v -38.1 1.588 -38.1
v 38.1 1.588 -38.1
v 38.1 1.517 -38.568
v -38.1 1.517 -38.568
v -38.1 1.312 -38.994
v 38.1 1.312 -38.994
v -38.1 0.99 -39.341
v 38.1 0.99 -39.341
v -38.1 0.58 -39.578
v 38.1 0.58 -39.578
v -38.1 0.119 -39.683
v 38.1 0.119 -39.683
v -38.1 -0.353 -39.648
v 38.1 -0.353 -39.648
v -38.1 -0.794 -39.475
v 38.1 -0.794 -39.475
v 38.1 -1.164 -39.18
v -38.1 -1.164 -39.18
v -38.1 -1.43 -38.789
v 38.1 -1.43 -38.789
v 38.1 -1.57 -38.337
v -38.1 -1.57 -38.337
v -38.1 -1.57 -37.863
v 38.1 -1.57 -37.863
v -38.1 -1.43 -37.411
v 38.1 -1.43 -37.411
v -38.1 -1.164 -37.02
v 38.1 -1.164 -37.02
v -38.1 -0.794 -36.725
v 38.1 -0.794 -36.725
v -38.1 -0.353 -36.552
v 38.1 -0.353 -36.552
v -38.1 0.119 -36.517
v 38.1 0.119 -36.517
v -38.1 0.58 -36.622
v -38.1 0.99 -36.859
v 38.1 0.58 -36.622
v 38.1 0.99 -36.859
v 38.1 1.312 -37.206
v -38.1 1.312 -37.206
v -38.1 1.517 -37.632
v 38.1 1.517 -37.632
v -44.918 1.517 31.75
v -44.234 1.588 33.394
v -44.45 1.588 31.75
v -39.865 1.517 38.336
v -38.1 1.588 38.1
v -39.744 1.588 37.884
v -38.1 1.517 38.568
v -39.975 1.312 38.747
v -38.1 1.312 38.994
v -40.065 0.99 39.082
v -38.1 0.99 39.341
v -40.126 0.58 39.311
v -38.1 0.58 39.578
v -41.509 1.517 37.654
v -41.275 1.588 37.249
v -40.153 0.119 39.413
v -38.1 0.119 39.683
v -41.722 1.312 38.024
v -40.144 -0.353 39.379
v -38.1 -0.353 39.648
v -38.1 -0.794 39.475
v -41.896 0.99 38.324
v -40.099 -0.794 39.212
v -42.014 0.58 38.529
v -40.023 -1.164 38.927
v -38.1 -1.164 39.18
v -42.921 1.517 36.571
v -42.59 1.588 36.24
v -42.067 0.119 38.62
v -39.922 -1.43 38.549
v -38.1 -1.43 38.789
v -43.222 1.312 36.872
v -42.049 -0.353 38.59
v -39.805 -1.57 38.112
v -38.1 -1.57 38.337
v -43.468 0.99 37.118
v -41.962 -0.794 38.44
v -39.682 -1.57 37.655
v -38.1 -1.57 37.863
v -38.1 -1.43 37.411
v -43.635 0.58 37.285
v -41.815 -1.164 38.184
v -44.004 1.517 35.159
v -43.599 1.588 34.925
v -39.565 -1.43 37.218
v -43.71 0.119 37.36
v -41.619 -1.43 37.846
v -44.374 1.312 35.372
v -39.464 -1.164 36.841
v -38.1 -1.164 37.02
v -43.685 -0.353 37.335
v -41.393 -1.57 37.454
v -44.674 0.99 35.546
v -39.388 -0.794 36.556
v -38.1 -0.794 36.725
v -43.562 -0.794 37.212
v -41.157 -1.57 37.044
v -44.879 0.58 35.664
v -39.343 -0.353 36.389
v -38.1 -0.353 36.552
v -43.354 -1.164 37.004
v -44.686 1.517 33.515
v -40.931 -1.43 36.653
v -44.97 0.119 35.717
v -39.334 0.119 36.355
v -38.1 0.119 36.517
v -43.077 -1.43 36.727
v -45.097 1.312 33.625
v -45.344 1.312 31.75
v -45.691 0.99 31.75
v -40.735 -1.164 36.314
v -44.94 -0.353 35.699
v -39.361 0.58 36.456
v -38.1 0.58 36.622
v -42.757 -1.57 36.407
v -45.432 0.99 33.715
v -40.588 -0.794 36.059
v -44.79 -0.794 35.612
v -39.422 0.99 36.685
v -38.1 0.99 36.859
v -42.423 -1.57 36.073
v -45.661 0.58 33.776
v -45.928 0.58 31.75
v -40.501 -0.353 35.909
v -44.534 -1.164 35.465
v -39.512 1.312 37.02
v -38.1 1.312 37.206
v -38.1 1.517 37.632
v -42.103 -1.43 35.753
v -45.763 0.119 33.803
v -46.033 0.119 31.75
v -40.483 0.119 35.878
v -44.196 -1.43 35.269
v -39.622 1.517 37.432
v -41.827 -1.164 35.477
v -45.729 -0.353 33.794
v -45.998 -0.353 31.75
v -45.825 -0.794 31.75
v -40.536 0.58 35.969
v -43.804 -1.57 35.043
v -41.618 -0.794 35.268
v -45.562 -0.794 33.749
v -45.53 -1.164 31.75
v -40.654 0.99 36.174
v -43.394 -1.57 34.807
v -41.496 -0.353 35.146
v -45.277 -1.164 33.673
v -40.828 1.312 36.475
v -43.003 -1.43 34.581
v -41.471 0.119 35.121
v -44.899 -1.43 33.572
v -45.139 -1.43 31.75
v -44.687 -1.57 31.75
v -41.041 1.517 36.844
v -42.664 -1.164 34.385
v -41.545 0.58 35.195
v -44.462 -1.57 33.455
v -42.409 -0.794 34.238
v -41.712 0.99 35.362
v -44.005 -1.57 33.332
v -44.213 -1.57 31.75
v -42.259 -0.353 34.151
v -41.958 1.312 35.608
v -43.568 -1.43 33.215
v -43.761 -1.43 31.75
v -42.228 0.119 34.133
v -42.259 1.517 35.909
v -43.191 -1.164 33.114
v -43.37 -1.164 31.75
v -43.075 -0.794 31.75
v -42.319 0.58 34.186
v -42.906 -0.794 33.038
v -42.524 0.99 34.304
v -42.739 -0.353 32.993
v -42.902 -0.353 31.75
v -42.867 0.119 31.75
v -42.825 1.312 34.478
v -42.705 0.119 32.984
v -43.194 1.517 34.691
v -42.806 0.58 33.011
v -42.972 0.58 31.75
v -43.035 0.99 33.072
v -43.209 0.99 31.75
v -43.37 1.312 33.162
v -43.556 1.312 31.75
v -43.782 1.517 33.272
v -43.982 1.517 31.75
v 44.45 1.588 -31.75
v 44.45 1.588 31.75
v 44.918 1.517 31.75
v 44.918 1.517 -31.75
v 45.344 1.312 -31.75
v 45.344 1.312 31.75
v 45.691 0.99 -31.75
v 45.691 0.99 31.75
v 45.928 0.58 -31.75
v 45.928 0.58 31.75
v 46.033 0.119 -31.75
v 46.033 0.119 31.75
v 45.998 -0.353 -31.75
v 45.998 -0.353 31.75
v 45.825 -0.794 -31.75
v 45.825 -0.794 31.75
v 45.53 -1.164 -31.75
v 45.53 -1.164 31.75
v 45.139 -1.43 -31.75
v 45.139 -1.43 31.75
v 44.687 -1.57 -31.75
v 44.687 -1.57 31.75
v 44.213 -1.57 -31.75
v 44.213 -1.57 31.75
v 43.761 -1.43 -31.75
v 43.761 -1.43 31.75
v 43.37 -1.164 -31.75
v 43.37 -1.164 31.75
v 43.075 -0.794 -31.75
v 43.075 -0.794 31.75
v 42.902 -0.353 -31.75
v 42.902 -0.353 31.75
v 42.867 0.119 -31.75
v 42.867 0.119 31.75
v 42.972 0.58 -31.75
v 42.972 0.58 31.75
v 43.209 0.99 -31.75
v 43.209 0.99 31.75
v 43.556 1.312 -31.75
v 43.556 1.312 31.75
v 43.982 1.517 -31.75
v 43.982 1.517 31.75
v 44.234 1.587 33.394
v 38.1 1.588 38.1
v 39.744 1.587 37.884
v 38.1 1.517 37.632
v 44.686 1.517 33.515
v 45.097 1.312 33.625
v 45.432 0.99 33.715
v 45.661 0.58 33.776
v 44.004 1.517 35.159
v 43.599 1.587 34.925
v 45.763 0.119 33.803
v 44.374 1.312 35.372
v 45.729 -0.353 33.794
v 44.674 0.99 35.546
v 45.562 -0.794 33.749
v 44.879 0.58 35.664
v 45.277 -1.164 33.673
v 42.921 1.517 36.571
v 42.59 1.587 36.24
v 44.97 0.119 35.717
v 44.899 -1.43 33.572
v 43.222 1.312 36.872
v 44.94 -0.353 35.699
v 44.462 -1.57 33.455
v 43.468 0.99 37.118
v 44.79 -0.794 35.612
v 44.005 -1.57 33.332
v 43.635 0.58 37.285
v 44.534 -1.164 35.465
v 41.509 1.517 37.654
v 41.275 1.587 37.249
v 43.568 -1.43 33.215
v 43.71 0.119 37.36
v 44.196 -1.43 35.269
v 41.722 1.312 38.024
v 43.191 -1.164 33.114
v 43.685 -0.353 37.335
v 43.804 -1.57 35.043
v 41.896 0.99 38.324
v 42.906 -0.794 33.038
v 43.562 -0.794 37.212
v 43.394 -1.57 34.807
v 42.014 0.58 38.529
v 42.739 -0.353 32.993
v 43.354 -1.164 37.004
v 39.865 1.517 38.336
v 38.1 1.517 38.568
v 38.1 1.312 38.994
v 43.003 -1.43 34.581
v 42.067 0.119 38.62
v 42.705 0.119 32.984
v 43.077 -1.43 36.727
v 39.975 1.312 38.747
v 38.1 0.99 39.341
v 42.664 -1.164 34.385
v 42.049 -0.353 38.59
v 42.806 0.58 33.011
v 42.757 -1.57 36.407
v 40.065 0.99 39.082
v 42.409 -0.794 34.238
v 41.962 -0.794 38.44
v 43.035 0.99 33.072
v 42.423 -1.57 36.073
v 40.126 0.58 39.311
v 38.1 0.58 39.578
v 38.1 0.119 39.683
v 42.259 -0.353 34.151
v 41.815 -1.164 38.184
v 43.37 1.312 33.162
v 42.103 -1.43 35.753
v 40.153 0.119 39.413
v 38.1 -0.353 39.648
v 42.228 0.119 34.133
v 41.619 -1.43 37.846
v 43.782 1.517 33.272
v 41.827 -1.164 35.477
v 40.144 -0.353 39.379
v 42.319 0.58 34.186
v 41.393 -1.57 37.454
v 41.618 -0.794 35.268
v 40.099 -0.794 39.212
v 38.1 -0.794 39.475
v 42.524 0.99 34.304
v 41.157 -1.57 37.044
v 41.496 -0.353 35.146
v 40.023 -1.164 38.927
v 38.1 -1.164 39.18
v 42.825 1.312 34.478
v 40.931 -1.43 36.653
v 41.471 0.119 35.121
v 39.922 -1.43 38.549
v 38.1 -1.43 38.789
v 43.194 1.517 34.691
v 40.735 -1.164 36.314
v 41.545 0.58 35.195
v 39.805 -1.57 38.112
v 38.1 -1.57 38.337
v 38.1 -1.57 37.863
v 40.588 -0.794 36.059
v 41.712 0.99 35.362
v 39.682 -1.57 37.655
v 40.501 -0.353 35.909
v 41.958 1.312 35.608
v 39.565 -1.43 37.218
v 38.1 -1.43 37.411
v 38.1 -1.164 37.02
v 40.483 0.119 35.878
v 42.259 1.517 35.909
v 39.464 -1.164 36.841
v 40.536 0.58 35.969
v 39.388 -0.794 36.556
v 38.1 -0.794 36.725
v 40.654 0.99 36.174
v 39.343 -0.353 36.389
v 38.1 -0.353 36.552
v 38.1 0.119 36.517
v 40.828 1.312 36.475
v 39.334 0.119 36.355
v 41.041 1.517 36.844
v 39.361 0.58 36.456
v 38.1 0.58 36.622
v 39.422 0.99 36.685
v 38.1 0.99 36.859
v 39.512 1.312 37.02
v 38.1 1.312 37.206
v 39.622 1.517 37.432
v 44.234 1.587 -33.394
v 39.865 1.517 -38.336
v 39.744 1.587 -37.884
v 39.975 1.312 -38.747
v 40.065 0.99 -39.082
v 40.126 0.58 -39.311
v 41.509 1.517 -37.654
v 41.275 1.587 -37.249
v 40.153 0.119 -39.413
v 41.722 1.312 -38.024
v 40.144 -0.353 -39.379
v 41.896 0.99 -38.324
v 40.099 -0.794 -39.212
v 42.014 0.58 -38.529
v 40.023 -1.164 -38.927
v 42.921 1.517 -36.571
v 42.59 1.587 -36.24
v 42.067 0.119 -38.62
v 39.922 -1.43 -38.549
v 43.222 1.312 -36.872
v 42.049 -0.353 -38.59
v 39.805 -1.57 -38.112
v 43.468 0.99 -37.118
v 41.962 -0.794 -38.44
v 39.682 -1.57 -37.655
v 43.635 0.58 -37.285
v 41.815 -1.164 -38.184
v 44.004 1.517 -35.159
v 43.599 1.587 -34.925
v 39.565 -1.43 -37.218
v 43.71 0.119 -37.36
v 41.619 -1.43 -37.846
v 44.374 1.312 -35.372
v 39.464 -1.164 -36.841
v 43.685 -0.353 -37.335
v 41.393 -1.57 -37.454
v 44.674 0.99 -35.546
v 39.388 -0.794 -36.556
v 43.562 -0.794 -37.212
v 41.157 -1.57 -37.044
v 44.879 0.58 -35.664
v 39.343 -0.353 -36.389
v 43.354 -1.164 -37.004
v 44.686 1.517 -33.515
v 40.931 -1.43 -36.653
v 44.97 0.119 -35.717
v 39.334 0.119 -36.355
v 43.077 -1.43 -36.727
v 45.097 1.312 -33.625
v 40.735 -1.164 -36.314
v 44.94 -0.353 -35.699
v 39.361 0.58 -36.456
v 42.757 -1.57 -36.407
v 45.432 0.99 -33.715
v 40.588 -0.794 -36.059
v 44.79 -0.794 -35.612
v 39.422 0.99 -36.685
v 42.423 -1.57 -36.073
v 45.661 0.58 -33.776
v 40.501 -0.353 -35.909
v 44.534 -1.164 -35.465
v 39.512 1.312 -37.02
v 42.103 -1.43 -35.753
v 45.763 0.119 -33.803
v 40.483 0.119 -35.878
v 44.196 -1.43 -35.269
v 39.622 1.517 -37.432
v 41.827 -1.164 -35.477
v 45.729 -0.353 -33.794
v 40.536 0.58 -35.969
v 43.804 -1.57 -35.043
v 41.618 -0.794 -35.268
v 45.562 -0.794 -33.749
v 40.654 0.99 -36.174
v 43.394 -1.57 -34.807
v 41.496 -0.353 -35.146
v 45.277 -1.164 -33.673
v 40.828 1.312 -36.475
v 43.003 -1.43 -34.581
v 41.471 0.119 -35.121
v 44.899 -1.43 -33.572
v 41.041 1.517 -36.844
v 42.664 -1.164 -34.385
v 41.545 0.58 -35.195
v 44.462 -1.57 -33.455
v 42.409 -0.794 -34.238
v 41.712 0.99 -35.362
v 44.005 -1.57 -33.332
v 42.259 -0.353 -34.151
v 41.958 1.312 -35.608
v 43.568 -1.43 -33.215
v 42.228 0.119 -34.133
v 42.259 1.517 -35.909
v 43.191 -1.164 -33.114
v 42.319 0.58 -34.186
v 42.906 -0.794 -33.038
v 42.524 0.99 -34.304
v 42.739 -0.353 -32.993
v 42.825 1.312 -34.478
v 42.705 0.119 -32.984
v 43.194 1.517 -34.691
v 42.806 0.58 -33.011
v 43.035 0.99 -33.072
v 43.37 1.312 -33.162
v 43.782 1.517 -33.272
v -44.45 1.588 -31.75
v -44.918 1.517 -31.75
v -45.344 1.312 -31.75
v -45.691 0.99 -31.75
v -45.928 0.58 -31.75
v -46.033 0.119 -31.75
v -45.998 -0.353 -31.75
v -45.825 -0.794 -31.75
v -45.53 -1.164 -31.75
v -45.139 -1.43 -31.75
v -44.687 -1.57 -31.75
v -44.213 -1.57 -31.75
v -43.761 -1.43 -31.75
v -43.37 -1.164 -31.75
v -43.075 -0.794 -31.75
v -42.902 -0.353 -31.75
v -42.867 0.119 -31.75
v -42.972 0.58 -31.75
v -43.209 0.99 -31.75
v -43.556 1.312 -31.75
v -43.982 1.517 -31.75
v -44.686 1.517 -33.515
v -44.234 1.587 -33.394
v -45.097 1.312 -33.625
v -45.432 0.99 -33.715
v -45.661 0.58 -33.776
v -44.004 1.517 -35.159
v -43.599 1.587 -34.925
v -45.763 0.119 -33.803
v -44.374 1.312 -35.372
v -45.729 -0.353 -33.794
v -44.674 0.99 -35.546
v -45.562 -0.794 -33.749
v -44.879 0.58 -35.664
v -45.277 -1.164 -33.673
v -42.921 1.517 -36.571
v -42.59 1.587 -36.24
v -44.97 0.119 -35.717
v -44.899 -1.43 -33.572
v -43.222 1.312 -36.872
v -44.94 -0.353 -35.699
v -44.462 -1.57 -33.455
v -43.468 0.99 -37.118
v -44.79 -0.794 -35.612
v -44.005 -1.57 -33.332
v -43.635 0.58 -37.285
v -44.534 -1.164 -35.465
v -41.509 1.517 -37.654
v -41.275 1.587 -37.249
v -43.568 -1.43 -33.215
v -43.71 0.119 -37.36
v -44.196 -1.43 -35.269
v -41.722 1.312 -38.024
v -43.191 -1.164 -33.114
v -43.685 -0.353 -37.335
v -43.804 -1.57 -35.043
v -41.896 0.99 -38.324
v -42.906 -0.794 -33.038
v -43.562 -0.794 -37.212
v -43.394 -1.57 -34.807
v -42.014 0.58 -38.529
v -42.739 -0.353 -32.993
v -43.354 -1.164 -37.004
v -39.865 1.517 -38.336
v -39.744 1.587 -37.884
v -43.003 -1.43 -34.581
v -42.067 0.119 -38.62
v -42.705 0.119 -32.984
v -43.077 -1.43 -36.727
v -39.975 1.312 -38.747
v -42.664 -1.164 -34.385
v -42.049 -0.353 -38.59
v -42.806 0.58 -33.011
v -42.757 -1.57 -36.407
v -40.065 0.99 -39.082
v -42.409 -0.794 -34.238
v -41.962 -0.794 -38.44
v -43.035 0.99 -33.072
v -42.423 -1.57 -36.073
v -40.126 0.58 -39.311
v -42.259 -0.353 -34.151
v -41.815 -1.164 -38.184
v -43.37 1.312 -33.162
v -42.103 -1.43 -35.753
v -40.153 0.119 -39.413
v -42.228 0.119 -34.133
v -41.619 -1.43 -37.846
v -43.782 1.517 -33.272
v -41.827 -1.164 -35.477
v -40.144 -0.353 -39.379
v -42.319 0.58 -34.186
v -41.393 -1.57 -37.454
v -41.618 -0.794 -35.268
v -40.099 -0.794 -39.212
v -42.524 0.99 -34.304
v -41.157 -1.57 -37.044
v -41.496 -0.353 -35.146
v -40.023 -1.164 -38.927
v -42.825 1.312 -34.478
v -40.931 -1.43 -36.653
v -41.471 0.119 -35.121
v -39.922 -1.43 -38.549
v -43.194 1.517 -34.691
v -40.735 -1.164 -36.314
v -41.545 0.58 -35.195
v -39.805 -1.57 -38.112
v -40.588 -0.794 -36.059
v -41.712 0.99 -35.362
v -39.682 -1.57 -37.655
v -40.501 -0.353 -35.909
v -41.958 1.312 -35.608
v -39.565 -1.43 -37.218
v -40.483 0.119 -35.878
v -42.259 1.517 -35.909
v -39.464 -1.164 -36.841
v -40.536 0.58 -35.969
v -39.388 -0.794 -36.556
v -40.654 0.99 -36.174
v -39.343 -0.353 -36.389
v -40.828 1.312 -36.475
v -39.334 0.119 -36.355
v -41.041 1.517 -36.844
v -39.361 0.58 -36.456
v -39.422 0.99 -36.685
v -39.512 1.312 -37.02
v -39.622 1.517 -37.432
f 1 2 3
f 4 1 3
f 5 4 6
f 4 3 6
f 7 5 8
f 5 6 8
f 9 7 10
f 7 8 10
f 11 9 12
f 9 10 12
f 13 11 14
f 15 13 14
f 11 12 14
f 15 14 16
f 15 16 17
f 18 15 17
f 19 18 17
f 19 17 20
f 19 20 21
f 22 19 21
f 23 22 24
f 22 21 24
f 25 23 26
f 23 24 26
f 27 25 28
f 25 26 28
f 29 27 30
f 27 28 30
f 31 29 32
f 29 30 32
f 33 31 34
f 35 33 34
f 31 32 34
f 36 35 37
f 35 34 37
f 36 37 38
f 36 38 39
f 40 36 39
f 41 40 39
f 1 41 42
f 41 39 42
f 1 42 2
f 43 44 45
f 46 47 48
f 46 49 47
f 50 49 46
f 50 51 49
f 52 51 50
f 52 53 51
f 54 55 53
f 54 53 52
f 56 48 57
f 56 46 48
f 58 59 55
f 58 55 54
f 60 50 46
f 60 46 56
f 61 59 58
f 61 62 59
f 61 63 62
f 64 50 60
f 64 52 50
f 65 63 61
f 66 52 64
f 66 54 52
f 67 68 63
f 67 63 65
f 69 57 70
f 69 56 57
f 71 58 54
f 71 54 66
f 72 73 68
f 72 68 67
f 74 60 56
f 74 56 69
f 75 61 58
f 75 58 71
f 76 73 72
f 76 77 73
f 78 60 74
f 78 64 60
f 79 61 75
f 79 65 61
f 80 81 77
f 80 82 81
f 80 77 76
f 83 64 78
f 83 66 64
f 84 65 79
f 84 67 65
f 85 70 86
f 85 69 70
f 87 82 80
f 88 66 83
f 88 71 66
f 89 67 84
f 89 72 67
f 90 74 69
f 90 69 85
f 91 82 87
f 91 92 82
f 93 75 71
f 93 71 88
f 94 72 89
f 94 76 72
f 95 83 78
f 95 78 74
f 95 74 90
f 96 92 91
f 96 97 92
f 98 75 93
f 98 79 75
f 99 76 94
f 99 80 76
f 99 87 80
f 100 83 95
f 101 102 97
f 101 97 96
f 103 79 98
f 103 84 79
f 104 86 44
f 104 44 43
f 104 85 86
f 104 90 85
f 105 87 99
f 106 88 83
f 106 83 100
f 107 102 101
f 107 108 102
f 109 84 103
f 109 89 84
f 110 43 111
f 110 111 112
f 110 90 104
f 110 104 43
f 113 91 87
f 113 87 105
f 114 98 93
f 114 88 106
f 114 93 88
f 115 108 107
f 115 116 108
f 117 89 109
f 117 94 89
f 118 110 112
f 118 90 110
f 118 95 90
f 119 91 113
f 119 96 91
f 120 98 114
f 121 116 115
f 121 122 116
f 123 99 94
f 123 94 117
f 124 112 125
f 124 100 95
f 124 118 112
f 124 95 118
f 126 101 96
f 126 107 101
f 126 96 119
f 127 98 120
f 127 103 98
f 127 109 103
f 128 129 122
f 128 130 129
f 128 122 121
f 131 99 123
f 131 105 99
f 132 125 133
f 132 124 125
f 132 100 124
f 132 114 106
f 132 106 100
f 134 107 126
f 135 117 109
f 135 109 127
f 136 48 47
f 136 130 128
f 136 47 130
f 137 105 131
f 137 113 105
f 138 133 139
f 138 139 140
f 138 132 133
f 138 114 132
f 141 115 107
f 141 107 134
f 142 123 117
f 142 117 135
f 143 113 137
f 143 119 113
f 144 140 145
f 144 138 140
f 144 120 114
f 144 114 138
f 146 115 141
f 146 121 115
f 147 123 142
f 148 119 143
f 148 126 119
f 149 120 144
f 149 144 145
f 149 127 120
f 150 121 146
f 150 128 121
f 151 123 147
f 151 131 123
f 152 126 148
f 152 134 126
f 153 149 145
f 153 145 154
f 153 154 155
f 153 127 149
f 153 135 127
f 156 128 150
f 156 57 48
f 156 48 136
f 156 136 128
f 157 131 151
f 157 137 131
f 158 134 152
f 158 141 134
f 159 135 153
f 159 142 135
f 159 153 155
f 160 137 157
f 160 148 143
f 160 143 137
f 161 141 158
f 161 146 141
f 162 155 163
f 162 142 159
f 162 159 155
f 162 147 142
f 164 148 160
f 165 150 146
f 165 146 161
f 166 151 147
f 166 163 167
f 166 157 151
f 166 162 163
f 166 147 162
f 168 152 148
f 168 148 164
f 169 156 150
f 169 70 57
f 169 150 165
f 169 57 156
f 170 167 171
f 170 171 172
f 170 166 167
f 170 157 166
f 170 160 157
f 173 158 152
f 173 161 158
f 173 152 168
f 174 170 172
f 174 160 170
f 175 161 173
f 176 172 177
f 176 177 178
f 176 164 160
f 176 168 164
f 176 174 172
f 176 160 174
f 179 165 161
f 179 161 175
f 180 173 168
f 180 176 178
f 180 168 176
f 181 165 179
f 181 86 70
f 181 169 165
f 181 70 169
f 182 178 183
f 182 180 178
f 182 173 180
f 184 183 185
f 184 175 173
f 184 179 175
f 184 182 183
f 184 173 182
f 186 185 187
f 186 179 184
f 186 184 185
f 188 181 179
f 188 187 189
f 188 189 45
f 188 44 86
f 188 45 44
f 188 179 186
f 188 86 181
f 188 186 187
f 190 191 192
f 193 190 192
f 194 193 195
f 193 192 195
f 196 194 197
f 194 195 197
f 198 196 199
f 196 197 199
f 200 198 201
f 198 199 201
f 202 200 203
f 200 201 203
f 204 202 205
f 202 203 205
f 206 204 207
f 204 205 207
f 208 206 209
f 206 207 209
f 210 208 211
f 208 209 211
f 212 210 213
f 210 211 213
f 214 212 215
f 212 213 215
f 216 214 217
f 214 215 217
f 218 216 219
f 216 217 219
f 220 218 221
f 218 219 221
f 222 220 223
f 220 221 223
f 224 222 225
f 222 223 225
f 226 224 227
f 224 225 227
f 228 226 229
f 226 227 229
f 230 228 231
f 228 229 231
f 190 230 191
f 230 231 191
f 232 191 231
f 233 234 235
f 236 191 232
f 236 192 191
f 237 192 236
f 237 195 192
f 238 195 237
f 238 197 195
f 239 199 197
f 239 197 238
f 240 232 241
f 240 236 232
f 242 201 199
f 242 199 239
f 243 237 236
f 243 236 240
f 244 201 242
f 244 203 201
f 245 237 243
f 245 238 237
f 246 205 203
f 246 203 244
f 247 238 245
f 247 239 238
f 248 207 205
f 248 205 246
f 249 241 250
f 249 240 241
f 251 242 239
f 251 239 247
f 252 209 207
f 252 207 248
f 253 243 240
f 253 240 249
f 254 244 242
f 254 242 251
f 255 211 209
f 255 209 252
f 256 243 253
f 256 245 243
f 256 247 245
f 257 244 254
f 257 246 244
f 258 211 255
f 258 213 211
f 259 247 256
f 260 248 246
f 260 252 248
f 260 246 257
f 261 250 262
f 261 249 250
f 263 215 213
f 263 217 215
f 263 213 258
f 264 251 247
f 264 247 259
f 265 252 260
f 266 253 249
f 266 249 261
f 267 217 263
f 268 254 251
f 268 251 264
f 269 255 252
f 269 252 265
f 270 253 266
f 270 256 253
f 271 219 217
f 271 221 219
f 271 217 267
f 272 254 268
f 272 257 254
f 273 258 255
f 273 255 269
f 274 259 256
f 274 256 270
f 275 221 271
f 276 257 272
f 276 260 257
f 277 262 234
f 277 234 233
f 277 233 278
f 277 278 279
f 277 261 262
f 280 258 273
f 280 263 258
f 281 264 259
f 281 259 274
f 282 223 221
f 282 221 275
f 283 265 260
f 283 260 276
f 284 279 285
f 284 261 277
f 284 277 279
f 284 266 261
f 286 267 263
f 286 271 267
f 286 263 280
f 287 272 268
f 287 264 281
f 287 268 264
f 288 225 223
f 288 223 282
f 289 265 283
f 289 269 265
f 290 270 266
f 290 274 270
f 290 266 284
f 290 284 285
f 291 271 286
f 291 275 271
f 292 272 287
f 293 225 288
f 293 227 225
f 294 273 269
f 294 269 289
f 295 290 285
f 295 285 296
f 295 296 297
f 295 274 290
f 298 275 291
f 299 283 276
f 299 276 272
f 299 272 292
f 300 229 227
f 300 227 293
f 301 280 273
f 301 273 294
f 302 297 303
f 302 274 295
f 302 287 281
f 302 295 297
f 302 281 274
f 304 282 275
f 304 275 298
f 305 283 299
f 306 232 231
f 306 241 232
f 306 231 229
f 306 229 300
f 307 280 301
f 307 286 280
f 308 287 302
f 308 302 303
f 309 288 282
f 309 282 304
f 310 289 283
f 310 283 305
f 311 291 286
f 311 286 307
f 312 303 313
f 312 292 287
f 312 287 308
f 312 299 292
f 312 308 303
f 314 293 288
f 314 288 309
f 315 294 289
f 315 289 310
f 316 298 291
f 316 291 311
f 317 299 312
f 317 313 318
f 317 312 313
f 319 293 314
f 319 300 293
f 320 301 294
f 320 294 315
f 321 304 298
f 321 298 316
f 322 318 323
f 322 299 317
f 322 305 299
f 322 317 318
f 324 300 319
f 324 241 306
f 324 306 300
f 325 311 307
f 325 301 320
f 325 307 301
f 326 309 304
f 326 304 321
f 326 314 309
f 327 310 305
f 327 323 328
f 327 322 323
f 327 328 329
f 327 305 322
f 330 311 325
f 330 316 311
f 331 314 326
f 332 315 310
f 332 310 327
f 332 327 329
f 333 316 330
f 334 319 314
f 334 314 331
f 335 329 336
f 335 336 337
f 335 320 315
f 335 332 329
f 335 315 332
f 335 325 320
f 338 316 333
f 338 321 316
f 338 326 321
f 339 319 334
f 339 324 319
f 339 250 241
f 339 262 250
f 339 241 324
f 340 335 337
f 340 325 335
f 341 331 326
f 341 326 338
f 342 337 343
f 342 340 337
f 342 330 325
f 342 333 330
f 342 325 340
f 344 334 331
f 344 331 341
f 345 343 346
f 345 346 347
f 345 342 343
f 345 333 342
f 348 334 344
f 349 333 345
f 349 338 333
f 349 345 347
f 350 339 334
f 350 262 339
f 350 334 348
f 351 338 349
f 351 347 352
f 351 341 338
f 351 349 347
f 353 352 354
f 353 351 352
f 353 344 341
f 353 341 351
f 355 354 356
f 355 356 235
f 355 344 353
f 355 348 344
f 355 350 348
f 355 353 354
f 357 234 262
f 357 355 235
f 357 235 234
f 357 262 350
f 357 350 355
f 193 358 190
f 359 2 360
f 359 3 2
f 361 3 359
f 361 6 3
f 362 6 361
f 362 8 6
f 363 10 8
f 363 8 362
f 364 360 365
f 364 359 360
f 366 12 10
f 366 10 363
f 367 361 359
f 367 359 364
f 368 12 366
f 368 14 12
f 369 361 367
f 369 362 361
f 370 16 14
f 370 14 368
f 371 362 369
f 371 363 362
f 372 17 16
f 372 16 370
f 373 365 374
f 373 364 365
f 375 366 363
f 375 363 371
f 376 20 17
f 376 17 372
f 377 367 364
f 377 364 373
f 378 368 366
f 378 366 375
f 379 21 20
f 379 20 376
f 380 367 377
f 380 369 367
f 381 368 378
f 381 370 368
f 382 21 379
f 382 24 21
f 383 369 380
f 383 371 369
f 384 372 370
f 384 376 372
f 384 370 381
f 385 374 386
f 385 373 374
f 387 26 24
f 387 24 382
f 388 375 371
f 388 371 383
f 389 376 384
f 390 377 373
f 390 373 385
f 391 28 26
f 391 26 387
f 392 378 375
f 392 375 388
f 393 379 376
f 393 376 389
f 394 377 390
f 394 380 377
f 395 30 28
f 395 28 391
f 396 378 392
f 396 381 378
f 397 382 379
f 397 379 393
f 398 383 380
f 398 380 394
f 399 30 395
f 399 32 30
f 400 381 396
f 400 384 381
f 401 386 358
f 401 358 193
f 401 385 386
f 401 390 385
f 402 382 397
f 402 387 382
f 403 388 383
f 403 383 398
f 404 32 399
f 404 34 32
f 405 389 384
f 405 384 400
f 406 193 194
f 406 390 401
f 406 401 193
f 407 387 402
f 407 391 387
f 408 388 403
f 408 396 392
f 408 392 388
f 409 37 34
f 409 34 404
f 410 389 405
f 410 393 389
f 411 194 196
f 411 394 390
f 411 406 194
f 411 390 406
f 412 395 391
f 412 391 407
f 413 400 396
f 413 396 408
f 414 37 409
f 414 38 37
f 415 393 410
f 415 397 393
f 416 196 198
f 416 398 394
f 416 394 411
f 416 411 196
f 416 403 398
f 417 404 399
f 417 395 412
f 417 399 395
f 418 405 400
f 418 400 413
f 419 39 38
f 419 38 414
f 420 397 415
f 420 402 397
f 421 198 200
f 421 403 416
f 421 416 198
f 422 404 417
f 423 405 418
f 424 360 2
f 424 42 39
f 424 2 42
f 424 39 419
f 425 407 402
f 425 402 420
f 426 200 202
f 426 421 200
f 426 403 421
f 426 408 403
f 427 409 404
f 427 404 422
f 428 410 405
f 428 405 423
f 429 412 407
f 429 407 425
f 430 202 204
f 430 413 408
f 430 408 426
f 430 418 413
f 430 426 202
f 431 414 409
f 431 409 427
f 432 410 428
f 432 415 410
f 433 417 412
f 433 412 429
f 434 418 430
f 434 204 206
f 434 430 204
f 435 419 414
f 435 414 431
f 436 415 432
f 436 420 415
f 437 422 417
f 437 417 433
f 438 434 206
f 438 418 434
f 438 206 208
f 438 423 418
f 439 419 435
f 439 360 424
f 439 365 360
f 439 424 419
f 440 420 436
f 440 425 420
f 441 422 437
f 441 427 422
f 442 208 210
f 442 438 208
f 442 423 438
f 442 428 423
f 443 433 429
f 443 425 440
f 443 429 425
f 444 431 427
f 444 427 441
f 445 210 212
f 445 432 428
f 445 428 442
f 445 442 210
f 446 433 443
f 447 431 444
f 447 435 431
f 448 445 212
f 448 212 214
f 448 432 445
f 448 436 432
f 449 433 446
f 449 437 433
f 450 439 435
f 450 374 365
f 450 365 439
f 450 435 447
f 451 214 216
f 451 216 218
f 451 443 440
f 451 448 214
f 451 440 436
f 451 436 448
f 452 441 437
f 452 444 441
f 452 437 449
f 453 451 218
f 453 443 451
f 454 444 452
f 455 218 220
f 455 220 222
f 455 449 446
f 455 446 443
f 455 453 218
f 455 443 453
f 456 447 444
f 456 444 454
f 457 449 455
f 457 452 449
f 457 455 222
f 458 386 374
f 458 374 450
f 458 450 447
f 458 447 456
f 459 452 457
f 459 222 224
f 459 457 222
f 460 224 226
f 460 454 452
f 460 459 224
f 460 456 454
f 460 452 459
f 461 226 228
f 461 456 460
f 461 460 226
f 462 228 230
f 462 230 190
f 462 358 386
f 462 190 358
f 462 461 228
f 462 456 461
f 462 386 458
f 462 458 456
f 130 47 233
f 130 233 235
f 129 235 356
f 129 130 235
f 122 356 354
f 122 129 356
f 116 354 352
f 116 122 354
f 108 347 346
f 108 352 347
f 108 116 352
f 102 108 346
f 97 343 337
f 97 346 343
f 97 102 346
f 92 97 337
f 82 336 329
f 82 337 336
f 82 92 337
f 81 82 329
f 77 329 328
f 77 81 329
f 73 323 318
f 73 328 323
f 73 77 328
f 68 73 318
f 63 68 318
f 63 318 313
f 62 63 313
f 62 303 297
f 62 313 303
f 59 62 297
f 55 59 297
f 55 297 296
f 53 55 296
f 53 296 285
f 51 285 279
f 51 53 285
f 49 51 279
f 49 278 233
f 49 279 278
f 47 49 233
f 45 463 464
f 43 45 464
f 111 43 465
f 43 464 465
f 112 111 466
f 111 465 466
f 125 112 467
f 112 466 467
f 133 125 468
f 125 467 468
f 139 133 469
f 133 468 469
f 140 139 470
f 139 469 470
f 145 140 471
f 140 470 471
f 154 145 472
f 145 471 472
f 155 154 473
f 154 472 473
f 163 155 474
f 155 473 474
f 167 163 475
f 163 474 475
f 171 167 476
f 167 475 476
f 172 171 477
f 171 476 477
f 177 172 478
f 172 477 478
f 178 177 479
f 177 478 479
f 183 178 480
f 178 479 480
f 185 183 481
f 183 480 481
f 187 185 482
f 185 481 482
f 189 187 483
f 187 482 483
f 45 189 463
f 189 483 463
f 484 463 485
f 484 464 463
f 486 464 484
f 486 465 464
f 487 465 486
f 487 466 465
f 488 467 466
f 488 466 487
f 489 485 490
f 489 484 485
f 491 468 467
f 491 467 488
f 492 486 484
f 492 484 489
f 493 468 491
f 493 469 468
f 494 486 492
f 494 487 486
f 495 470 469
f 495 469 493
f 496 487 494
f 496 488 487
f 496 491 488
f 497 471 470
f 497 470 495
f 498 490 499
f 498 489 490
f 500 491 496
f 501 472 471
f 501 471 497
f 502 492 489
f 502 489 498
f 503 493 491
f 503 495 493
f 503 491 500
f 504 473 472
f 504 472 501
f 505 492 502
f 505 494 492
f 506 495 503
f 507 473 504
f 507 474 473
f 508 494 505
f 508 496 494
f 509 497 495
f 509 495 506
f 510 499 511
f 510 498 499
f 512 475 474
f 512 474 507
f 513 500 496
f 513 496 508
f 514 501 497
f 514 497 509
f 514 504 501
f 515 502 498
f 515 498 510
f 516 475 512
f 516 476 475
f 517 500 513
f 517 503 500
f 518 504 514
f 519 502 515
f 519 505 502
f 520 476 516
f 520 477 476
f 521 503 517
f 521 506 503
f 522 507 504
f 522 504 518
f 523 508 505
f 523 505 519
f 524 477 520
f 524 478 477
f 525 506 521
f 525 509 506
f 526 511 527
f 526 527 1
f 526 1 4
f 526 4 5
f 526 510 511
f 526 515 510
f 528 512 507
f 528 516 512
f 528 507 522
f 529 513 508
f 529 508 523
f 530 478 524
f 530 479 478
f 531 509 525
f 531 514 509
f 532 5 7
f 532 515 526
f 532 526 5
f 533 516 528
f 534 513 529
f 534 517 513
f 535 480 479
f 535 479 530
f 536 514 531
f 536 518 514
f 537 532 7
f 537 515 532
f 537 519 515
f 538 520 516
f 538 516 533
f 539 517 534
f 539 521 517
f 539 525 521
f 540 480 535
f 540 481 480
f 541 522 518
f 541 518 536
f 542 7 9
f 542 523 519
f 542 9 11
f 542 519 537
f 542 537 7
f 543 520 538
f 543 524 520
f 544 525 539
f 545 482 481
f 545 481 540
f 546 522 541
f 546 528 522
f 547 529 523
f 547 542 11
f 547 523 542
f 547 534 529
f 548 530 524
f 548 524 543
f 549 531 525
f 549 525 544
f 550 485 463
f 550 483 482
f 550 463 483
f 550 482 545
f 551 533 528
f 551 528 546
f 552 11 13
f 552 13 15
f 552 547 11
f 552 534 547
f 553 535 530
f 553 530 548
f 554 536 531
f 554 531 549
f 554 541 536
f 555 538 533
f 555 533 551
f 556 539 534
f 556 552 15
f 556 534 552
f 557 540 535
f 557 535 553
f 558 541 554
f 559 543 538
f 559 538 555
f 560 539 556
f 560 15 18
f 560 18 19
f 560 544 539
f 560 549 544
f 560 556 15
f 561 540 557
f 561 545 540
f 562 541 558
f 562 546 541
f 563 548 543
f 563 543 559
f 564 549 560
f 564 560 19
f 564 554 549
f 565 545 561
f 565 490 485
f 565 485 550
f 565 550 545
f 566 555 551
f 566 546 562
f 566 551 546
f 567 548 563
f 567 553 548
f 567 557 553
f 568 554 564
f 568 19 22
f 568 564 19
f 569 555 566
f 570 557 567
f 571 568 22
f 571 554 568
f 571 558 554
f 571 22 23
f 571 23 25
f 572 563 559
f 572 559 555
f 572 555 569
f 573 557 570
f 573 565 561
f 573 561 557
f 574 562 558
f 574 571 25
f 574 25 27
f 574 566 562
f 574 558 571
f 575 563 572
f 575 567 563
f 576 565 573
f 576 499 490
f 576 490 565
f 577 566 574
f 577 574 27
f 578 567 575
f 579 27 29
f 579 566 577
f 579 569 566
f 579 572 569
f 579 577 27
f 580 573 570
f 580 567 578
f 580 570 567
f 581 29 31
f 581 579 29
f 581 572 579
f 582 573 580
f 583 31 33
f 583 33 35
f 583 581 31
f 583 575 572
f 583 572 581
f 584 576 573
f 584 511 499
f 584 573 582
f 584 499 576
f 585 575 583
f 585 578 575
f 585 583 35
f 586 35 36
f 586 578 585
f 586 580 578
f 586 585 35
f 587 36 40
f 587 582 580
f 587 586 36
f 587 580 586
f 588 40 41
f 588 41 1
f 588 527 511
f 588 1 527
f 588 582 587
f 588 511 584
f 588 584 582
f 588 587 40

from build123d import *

# Parameters (mm, degrees)
F1_R = 1.5875


with BuildPart() as f2:
    # F2: sweep along a path in F0
    with BuildLine(Plane.XZ) as f2_path:
        Line((0, 38.1), (-38.1, 38.1))
        ThreePointArc((-38.1, 38.1), (-42.590128, 36.240128), (-44.45, 31.75))
        Line((-44.45, 31.75), (-44.45, -31.75))
        ThreePointArc((-44.45, -31.75), (-42.590128, -36.240128), (-38.1, -38.1))
        Line((-38.1, -38.1), (38.1, -38.1))
        ThreePointArc((38.1, -38.1), (42.590128, -36.240128), (44.45, -31.75))
        Line((44.45, -31.75), (44.45, 31.75))
        ThreePointArc((44.45, 31.75), (42.590128, 36.240128), (38.1, 38.1))
        Line((38.1, 38.1), (0, 38.1))
    # F1 (on Right) → F2 (sweep)
    with BuildSketch(Plane.YZ):
        with Locations((0, 38.1)):
            Circle(F1_R)
    sweep(path=f2_path.line)


solid = f2.part
